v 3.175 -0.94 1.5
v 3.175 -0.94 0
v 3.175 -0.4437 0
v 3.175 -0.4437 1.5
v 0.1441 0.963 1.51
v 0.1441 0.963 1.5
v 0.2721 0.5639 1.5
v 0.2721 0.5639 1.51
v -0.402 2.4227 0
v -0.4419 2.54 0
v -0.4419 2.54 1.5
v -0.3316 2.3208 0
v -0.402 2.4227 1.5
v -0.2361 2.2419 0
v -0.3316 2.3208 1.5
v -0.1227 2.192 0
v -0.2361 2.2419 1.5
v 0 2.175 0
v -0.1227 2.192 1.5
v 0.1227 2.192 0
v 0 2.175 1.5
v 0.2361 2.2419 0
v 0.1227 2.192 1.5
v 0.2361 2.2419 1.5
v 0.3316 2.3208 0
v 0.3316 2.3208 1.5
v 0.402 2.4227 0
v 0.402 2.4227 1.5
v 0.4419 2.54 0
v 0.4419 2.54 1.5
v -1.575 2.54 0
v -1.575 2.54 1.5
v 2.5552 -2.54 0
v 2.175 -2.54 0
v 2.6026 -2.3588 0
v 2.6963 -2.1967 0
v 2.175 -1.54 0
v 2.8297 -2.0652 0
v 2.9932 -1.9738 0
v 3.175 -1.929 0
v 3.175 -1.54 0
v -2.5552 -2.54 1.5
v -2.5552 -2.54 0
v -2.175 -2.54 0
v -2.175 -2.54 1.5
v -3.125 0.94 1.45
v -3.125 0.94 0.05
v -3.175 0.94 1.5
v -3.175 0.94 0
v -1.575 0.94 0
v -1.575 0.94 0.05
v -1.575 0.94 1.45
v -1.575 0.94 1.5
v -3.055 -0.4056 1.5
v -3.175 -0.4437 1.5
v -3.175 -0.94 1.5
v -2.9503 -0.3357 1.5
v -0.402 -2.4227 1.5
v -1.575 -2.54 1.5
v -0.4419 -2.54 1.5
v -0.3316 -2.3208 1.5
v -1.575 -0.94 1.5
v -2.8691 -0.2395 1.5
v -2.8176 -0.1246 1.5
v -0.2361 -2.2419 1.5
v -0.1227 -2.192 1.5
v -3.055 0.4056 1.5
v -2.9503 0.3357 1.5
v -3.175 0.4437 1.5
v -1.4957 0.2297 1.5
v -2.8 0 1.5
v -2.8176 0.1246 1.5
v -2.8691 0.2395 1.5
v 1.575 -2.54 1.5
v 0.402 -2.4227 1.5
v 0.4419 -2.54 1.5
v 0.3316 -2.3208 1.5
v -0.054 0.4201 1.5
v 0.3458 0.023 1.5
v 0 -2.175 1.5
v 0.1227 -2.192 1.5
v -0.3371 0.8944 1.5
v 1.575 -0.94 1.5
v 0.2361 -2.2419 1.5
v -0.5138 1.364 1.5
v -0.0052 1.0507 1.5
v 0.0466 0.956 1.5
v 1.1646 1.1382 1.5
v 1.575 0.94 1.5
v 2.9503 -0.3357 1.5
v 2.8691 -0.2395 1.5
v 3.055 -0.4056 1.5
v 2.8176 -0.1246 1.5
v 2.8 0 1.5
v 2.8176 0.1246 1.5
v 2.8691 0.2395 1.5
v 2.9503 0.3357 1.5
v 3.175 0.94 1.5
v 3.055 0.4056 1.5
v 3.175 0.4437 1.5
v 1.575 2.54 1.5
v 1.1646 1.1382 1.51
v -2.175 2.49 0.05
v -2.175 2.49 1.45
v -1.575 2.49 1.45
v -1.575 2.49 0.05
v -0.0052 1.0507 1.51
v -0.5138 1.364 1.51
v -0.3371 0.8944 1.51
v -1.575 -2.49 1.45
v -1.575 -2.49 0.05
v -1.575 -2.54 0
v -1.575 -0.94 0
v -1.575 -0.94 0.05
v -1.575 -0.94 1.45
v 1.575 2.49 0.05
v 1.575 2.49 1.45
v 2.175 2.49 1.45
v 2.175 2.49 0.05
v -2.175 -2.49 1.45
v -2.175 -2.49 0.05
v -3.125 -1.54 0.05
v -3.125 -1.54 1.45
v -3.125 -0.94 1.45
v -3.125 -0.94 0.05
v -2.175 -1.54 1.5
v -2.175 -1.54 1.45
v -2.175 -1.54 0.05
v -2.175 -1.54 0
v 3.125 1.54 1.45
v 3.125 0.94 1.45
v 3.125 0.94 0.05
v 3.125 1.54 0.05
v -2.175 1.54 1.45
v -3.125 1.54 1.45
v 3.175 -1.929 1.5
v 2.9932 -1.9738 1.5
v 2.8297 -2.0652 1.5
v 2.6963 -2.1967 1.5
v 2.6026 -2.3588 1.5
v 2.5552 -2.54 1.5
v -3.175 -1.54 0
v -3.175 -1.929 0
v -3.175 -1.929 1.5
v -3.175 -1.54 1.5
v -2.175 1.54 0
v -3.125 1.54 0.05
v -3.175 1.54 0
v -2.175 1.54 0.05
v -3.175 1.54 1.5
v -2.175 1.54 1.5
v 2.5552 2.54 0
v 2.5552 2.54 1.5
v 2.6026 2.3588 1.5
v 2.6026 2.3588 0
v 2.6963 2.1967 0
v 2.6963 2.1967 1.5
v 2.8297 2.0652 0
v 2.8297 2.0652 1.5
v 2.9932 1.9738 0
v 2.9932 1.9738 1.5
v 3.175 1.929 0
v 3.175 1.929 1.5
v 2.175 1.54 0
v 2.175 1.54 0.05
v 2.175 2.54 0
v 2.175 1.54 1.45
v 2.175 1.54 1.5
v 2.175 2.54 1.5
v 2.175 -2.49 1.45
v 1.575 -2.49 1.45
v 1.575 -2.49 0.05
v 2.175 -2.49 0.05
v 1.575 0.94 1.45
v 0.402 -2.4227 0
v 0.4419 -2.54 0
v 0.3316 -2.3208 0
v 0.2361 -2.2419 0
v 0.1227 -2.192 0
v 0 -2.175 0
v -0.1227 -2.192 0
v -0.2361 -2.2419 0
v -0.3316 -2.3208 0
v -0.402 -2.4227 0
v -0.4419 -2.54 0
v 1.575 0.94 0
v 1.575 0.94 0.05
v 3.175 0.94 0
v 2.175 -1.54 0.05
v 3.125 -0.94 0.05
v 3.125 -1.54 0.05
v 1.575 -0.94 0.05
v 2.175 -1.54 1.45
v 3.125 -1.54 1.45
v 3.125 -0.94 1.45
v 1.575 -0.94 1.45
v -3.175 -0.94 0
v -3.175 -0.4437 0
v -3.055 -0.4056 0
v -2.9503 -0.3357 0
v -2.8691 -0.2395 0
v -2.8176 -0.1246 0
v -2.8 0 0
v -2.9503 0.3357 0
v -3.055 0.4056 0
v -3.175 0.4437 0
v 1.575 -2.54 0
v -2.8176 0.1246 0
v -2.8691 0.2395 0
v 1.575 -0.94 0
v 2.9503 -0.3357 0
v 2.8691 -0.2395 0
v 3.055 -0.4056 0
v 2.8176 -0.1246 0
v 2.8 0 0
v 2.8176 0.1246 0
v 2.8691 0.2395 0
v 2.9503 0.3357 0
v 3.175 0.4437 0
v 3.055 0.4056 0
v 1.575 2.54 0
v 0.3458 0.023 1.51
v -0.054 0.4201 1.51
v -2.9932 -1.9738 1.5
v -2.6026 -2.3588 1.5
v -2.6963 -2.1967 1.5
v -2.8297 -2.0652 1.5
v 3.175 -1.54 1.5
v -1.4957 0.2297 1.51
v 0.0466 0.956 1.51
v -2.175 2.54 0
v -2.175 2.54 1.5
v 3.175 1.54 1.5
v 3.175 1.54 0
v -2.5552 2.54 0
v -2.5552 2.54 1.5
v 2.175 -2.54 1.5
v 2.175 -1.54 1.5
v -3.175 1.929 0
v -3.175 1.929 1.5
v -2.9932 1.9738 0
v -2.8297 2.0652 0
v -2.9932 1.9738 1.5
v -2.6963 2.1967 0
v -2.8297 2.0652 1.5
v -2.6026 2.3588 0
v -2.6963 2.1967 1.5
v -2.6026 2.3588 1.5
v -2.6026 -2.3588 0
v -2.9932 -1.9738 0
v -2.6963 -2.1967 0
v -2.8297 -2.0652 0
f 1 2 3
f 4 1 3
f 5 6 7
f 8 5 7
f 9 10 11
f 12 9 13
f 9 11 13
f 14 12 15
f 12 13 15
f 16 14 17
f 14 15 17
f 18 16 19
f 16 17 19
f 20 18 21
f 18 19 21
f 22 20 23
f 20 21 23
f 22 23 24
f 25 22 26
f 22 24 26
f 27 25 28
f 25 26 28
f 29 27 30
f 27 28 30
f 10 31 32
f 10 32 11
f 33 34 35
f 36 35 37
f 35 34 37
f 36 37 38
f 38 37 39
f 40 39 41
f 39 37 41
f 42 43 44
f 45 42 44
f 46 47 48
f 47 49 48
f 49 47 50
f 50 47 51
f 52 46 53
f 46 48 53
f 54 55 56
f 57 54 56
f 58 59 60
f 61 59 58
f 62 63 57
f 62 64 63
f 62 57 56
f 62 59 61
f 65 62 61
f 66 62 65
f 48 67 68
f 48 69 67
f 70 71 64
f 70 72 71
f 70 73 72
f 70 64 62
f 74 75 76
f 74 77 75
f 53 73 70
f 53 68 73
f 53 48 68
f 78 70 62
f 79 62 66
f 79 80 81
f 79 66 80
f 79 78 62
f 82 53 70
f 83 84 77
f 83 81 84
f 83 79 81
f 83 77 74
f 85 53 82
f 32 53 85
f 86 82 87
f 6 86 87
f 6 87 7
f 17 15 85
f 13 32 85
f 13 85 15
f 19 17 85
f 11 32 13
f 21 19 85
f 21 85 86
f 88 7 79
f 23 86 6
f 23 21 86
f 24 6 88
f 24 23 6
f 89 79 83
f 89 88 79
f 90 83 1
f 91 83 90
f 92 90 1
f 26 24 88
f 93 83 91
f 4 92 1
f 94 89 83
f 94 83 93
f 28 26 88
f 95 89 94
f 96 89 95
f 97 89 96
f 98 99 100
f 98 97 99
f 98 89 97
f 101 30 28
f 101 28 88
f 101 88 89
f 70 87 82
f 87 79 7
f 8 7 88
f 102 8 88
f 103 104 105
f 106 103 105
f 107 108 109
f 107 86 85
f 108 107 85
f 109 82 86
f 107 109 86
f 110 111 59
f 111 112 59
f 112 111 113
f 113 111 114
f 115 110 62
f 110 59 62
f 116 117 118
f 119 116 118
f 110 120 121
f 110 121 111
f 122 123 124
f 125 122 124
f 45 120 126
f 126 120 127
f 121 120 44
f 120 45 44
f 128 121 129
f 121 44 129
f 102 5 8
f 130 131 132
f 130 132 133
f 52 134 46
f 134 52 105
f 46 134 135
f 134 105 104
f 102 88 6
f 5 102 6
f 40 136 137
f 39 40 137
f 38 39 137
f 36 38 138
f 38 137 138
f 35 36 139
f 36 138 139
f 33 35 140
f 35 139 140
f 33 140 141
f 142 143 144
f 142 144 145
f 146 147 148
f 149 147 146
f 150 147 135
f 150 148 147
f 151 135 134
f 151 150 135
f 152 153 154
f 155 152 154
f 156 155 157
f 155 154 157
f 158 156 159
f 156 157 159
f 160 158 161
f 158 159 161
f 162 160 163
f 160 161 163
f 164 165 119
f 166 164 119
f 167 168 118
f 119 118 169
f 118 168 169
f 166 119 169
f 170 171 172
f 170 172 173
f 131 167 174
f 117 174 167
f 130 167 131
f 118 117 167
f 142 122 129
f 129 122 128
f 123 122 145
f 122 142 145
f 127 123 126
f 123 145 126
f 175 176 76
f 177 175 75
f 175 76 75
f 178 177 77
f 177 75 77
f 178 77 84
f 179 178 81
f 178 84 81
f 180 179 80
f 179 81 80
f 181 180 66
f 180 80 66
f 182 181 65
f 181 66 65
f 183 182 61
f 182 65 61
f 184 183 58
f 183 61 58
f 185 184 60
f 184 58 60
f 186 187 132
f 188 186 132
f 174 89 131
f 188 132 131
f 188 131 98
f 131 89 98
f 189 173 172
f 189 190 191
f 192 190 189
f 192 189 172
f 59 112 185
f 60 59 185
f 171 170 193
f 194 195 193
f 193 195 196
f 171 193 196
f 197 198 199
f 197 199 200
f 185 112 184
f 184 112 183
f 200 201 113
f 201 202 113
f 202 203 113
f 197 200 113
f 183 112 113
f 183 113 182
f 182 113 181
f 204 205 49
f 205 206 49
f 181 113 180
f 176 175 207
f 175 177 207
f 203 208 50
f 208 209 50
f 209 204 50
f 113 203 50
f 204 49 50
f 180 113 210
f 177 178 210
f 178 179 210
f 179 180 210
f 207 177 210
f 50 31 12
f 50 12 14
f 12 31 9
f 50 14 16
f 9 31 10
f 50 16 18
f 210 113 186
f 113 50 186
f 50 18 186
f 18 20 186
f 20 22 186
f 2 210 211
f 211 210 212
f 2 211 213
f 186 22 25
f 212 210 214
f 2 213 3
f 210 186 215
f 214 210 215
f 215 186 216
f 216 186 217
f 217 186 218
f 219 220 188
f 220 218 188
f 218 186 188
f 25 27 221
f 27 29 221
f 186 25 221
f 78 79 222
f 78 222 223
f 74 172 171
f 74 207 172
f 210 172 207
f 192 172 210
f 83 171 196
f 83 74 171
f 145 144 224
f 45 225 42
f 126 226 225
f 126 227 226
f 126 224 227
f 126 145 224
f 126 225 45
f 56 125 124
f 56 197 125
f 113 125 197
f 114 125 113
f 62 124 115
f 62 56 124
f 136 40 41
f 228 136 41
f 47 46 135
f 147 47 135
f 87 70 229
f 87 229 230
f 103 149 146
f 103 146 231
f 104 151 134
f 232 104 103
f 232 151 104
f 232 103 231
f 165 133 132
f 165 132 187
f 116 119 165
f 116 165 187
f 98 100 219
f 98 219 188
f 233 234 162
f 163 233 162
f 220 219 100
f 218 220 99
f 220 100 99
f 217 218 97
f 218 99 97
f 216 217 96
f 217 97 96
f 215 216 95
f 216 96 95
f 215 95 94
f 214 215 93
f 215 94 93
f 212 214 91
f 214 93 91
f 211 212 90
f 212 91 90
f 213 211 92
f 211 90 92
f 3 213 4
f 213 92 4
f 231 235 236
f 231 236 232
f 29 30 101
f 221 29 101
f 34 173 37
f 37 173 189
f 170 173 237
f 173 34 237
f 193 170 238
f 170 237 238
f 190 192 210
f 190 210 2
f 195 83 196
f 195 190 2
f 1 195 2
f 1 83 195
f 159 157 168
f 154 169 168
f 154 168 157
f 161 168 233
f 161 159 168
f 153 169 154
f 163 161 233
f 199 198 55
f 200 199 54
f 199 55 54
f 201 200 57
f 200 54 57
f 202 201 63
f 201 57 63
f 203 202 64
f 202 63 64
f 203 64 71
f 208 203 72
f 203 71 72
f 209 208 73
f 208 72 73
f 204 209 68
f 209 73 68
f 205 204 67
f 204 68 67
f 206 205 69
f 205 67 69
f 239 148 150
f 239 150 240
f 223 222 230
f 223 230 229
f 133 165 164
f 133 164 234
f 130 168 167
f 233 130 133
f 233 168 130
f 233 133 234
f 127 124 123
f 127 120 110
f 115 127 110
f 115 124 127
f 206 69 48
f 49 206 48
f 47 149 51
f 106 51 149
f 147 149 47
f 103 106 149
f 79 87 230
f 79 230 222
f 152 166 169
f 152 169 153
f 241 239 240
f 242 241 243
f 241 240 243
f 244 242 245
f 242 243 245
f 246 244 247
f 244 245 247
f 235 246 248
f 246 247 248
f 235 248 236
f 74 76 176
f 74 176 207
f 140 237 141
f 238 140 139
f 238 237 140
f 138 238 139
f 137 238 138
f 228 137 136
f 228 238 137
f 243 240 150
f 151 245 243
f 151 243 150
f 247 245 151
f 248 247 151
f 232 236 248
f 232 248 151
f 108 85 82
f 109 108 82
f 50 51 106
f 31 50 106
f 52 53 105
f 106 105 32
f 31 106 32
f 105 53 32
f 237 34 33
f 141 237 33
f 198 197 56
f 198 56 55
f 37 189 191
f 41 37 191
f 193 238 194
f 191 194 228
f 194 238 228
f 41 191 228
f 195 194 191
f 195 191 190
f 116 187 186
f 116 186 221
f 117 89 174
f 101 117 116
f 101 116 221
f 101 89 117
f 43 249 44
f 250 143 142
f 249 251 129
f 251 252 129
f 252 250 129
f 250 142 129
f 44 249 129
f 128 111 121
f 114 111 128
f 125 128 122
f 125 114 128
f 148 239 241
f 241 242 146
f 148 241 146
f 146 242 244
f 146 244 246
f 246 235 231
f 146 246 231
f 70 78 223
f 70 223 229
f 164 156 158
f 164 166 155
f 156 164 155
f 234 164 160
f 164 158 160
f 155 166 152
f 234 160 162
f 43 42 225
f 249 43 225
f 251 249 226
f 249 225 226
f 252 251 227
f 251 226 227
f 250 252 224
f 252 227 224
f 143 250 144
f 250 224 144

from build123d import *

# Parameters (mm, degrees)
SKETCH1_W           = 6.35
SKETCH1_H           = 5.08
BOSS_EXTRUDE1_DEPTH = 1.5
SKETCH2_R           = 0.7
SKETCH2_R_2         = 0.45
CUT_EXTRUDE1_DEPTH  = 2.5
CUT_EXTRUDE2_DEPTH  = 0.05
BOSS_EXTRUDE2_DEPTH = 0.01
SKETCH5_W           = 0.05
SKETCH5_H           = 0.6
SKETCH5_W_2         = 0.6
SKETCH5_H_2         = 0.05
CUT_EXTRUDE3_DEPTH  = 2.45
CUT_EXTRUDE4_DEPTH  = 0.05


with BuildPart() as part:
    # Sketch1 → Boss-Extrude1 (new body)
    with BuildSketch(Plane.XY):
        Rectangle(SKETCH1_W, SKETCH1_H)
    extrude(amount=BOSS_EXTRUDE1_DEPTH)

    # Sketch2 → Cut-Extrude1 (cut, through all)
    with BuildSketch(Plane.XY.offset(1.5)):
        with Locations((-3.25, 2.625)):
            Circle(SKETCH2_R)
        with Locations((3.25, 2.625)):
            Circle(SKETCH2_R)
        with Locations((3.25, -2.625)):
            Circle(SKETCH2_R)
        with Locations((-3.25, -2.625)):
            Circle(SKETCH2_R)
        with Locations((0, 2.625)):
            Circle(SKETCH2_R_2)
        with Locations((0, -2.625)):
            Circle(SKETCH2_R_2)
        with Locations((-3.25, 0)):
            Circle(SKETCH2_R_2)
        with Locations((3.25, 0)):
            Circle(SKETCH2_R_2)
    extrude(amount=-CUT_EXTRUDE1_DEPTH, mode=Mode.SUBTRACT)

    # Sketch3 → Cut-Extrude2 (cut)
    with BuildSketch(Plane.XY.offset(1.5)):
        Polygon((-3.175, 1.54), (-2.175, 1.54), (-2.175, 2.54), (-1.575, 2.54), (-1.575, 0.94), (-3.175, 0.94), align=None)
        Polygon((-1.575, -0.94), (-3.175, -0.94), (-3.175, -1.54), (-2.175, -1.54), (-2.175, -2.54), (-1.575, -2.54), align=None)
        Polygon((1.575, -2.54), (1.575, -0.94), (3.175, -0.94), (3.175, -1.54), (2.175, -1.54), (2.175, -2.54), align=None)
        Polygon((1.575, 0.94), (3.175, 0.94), (3.175, 1.54), (2.175, 1.54), (2.175, 2.54), (1.575, 2.54), align=None)
    extrude(amount=-CUT_EXTRUDE2_DEPTH, mode=Mode.SUBTRACT)

    # Sketch4 → Boss-Extrude2 (add)
    with BuildSketch(Plane.XY.offset(1.5)):
        Polygon((-1.495729798, 0.229716512), (0.04659868, 0.955998176), (0.345815845, 0.022984653), (-0.054047094, 0.420127435), align=None)
        Polygon((-0.337060629, 0.894394217), (-0.0051867, 1.050673475), (-0.513753466, 1.364021583), align=None)
        Polygon((0.144089984, 0.962974572), (0.272069208, 0.563912081), (1.164582814, 1.138248631), align=None)
    extrude(amount=BOSS_EXTRUDE2_DEPTH)

    # Sketch5 → Cut-Extrude3 (cut, through all)
    with BuildSketch(Plane.XY.offset(1.45)):
        with Locations((-3.15, 1.24)):
            Rectangle(SKETCH5_W, SKETCH5_H)
        with Locations((-1.875, 2.515)):
            Rectangle(SKETCH5_W_2, SKETCH5_H_2)
        with Locations((1.875, 2.515)):
            Rectangle(SKETCH5_W_2, SKETCH5_H_2)
        with Locations((3.15, 1.24)):
            Rectangle(SKETCH5_W, SKETCH5_H)
        with Locations((3.15, -1.24)):
            Rectangle(SKETCH5_W, SKETCH5_H)
        with Locations((1.875, -2.515)):
            Rectangle(SKETCH5_W_2, SKETCH5_H_2)
        with Locations((-1.875, -2.515)):
            Rectangle(SKETCH5_W_2, SKETCH5_H_2)
        with Locations((-3.15, -1.24)):
            Rectangle(SKETCH5_W, SKETCH5_H)
    extrude(amount=-CUT_EXTRUDE3_DEPTH, mode=Mode.SUBTRACT)

    # Sketch6 → Cut-Extrude4 (cut)
    with BuildSketch(Plane(origin=(0, 0, 0), x_dir=(-1, 0, 0), z_dir=(0, 0, -1))):
        Polygon((3.175, 1.54), (2.175, 1.54), (2.175, 2.54), (1.575, 2.54), (1.575, 0.94), (3.175, 0.94), align=None)
        Polygon((-3.175, 0.94), (-1.575, 0.94), (-1.575, 2.54), (-2.175, 2.54), (-2.175, 1.54), (-3.175, 1.54), align=None)
        Polygon((-1.575, -2.54), (-1.575, -0.94), (-3.175, -0.94), (-3.175, -1.54), (-2.175, -1.54), (-2.175, -2.54), align=None)
        Polygon((1.575, -2.54), (2.175, -2.54), (2.175, -1.54), (3.175, -1.54), (3.175, -0.94), (1.575, -0.94), align=None)
    extrude(amount=-CUT_EXTRUDE4_DEPTH, mode=Mode.SUBTRACT)


solid = part.part
